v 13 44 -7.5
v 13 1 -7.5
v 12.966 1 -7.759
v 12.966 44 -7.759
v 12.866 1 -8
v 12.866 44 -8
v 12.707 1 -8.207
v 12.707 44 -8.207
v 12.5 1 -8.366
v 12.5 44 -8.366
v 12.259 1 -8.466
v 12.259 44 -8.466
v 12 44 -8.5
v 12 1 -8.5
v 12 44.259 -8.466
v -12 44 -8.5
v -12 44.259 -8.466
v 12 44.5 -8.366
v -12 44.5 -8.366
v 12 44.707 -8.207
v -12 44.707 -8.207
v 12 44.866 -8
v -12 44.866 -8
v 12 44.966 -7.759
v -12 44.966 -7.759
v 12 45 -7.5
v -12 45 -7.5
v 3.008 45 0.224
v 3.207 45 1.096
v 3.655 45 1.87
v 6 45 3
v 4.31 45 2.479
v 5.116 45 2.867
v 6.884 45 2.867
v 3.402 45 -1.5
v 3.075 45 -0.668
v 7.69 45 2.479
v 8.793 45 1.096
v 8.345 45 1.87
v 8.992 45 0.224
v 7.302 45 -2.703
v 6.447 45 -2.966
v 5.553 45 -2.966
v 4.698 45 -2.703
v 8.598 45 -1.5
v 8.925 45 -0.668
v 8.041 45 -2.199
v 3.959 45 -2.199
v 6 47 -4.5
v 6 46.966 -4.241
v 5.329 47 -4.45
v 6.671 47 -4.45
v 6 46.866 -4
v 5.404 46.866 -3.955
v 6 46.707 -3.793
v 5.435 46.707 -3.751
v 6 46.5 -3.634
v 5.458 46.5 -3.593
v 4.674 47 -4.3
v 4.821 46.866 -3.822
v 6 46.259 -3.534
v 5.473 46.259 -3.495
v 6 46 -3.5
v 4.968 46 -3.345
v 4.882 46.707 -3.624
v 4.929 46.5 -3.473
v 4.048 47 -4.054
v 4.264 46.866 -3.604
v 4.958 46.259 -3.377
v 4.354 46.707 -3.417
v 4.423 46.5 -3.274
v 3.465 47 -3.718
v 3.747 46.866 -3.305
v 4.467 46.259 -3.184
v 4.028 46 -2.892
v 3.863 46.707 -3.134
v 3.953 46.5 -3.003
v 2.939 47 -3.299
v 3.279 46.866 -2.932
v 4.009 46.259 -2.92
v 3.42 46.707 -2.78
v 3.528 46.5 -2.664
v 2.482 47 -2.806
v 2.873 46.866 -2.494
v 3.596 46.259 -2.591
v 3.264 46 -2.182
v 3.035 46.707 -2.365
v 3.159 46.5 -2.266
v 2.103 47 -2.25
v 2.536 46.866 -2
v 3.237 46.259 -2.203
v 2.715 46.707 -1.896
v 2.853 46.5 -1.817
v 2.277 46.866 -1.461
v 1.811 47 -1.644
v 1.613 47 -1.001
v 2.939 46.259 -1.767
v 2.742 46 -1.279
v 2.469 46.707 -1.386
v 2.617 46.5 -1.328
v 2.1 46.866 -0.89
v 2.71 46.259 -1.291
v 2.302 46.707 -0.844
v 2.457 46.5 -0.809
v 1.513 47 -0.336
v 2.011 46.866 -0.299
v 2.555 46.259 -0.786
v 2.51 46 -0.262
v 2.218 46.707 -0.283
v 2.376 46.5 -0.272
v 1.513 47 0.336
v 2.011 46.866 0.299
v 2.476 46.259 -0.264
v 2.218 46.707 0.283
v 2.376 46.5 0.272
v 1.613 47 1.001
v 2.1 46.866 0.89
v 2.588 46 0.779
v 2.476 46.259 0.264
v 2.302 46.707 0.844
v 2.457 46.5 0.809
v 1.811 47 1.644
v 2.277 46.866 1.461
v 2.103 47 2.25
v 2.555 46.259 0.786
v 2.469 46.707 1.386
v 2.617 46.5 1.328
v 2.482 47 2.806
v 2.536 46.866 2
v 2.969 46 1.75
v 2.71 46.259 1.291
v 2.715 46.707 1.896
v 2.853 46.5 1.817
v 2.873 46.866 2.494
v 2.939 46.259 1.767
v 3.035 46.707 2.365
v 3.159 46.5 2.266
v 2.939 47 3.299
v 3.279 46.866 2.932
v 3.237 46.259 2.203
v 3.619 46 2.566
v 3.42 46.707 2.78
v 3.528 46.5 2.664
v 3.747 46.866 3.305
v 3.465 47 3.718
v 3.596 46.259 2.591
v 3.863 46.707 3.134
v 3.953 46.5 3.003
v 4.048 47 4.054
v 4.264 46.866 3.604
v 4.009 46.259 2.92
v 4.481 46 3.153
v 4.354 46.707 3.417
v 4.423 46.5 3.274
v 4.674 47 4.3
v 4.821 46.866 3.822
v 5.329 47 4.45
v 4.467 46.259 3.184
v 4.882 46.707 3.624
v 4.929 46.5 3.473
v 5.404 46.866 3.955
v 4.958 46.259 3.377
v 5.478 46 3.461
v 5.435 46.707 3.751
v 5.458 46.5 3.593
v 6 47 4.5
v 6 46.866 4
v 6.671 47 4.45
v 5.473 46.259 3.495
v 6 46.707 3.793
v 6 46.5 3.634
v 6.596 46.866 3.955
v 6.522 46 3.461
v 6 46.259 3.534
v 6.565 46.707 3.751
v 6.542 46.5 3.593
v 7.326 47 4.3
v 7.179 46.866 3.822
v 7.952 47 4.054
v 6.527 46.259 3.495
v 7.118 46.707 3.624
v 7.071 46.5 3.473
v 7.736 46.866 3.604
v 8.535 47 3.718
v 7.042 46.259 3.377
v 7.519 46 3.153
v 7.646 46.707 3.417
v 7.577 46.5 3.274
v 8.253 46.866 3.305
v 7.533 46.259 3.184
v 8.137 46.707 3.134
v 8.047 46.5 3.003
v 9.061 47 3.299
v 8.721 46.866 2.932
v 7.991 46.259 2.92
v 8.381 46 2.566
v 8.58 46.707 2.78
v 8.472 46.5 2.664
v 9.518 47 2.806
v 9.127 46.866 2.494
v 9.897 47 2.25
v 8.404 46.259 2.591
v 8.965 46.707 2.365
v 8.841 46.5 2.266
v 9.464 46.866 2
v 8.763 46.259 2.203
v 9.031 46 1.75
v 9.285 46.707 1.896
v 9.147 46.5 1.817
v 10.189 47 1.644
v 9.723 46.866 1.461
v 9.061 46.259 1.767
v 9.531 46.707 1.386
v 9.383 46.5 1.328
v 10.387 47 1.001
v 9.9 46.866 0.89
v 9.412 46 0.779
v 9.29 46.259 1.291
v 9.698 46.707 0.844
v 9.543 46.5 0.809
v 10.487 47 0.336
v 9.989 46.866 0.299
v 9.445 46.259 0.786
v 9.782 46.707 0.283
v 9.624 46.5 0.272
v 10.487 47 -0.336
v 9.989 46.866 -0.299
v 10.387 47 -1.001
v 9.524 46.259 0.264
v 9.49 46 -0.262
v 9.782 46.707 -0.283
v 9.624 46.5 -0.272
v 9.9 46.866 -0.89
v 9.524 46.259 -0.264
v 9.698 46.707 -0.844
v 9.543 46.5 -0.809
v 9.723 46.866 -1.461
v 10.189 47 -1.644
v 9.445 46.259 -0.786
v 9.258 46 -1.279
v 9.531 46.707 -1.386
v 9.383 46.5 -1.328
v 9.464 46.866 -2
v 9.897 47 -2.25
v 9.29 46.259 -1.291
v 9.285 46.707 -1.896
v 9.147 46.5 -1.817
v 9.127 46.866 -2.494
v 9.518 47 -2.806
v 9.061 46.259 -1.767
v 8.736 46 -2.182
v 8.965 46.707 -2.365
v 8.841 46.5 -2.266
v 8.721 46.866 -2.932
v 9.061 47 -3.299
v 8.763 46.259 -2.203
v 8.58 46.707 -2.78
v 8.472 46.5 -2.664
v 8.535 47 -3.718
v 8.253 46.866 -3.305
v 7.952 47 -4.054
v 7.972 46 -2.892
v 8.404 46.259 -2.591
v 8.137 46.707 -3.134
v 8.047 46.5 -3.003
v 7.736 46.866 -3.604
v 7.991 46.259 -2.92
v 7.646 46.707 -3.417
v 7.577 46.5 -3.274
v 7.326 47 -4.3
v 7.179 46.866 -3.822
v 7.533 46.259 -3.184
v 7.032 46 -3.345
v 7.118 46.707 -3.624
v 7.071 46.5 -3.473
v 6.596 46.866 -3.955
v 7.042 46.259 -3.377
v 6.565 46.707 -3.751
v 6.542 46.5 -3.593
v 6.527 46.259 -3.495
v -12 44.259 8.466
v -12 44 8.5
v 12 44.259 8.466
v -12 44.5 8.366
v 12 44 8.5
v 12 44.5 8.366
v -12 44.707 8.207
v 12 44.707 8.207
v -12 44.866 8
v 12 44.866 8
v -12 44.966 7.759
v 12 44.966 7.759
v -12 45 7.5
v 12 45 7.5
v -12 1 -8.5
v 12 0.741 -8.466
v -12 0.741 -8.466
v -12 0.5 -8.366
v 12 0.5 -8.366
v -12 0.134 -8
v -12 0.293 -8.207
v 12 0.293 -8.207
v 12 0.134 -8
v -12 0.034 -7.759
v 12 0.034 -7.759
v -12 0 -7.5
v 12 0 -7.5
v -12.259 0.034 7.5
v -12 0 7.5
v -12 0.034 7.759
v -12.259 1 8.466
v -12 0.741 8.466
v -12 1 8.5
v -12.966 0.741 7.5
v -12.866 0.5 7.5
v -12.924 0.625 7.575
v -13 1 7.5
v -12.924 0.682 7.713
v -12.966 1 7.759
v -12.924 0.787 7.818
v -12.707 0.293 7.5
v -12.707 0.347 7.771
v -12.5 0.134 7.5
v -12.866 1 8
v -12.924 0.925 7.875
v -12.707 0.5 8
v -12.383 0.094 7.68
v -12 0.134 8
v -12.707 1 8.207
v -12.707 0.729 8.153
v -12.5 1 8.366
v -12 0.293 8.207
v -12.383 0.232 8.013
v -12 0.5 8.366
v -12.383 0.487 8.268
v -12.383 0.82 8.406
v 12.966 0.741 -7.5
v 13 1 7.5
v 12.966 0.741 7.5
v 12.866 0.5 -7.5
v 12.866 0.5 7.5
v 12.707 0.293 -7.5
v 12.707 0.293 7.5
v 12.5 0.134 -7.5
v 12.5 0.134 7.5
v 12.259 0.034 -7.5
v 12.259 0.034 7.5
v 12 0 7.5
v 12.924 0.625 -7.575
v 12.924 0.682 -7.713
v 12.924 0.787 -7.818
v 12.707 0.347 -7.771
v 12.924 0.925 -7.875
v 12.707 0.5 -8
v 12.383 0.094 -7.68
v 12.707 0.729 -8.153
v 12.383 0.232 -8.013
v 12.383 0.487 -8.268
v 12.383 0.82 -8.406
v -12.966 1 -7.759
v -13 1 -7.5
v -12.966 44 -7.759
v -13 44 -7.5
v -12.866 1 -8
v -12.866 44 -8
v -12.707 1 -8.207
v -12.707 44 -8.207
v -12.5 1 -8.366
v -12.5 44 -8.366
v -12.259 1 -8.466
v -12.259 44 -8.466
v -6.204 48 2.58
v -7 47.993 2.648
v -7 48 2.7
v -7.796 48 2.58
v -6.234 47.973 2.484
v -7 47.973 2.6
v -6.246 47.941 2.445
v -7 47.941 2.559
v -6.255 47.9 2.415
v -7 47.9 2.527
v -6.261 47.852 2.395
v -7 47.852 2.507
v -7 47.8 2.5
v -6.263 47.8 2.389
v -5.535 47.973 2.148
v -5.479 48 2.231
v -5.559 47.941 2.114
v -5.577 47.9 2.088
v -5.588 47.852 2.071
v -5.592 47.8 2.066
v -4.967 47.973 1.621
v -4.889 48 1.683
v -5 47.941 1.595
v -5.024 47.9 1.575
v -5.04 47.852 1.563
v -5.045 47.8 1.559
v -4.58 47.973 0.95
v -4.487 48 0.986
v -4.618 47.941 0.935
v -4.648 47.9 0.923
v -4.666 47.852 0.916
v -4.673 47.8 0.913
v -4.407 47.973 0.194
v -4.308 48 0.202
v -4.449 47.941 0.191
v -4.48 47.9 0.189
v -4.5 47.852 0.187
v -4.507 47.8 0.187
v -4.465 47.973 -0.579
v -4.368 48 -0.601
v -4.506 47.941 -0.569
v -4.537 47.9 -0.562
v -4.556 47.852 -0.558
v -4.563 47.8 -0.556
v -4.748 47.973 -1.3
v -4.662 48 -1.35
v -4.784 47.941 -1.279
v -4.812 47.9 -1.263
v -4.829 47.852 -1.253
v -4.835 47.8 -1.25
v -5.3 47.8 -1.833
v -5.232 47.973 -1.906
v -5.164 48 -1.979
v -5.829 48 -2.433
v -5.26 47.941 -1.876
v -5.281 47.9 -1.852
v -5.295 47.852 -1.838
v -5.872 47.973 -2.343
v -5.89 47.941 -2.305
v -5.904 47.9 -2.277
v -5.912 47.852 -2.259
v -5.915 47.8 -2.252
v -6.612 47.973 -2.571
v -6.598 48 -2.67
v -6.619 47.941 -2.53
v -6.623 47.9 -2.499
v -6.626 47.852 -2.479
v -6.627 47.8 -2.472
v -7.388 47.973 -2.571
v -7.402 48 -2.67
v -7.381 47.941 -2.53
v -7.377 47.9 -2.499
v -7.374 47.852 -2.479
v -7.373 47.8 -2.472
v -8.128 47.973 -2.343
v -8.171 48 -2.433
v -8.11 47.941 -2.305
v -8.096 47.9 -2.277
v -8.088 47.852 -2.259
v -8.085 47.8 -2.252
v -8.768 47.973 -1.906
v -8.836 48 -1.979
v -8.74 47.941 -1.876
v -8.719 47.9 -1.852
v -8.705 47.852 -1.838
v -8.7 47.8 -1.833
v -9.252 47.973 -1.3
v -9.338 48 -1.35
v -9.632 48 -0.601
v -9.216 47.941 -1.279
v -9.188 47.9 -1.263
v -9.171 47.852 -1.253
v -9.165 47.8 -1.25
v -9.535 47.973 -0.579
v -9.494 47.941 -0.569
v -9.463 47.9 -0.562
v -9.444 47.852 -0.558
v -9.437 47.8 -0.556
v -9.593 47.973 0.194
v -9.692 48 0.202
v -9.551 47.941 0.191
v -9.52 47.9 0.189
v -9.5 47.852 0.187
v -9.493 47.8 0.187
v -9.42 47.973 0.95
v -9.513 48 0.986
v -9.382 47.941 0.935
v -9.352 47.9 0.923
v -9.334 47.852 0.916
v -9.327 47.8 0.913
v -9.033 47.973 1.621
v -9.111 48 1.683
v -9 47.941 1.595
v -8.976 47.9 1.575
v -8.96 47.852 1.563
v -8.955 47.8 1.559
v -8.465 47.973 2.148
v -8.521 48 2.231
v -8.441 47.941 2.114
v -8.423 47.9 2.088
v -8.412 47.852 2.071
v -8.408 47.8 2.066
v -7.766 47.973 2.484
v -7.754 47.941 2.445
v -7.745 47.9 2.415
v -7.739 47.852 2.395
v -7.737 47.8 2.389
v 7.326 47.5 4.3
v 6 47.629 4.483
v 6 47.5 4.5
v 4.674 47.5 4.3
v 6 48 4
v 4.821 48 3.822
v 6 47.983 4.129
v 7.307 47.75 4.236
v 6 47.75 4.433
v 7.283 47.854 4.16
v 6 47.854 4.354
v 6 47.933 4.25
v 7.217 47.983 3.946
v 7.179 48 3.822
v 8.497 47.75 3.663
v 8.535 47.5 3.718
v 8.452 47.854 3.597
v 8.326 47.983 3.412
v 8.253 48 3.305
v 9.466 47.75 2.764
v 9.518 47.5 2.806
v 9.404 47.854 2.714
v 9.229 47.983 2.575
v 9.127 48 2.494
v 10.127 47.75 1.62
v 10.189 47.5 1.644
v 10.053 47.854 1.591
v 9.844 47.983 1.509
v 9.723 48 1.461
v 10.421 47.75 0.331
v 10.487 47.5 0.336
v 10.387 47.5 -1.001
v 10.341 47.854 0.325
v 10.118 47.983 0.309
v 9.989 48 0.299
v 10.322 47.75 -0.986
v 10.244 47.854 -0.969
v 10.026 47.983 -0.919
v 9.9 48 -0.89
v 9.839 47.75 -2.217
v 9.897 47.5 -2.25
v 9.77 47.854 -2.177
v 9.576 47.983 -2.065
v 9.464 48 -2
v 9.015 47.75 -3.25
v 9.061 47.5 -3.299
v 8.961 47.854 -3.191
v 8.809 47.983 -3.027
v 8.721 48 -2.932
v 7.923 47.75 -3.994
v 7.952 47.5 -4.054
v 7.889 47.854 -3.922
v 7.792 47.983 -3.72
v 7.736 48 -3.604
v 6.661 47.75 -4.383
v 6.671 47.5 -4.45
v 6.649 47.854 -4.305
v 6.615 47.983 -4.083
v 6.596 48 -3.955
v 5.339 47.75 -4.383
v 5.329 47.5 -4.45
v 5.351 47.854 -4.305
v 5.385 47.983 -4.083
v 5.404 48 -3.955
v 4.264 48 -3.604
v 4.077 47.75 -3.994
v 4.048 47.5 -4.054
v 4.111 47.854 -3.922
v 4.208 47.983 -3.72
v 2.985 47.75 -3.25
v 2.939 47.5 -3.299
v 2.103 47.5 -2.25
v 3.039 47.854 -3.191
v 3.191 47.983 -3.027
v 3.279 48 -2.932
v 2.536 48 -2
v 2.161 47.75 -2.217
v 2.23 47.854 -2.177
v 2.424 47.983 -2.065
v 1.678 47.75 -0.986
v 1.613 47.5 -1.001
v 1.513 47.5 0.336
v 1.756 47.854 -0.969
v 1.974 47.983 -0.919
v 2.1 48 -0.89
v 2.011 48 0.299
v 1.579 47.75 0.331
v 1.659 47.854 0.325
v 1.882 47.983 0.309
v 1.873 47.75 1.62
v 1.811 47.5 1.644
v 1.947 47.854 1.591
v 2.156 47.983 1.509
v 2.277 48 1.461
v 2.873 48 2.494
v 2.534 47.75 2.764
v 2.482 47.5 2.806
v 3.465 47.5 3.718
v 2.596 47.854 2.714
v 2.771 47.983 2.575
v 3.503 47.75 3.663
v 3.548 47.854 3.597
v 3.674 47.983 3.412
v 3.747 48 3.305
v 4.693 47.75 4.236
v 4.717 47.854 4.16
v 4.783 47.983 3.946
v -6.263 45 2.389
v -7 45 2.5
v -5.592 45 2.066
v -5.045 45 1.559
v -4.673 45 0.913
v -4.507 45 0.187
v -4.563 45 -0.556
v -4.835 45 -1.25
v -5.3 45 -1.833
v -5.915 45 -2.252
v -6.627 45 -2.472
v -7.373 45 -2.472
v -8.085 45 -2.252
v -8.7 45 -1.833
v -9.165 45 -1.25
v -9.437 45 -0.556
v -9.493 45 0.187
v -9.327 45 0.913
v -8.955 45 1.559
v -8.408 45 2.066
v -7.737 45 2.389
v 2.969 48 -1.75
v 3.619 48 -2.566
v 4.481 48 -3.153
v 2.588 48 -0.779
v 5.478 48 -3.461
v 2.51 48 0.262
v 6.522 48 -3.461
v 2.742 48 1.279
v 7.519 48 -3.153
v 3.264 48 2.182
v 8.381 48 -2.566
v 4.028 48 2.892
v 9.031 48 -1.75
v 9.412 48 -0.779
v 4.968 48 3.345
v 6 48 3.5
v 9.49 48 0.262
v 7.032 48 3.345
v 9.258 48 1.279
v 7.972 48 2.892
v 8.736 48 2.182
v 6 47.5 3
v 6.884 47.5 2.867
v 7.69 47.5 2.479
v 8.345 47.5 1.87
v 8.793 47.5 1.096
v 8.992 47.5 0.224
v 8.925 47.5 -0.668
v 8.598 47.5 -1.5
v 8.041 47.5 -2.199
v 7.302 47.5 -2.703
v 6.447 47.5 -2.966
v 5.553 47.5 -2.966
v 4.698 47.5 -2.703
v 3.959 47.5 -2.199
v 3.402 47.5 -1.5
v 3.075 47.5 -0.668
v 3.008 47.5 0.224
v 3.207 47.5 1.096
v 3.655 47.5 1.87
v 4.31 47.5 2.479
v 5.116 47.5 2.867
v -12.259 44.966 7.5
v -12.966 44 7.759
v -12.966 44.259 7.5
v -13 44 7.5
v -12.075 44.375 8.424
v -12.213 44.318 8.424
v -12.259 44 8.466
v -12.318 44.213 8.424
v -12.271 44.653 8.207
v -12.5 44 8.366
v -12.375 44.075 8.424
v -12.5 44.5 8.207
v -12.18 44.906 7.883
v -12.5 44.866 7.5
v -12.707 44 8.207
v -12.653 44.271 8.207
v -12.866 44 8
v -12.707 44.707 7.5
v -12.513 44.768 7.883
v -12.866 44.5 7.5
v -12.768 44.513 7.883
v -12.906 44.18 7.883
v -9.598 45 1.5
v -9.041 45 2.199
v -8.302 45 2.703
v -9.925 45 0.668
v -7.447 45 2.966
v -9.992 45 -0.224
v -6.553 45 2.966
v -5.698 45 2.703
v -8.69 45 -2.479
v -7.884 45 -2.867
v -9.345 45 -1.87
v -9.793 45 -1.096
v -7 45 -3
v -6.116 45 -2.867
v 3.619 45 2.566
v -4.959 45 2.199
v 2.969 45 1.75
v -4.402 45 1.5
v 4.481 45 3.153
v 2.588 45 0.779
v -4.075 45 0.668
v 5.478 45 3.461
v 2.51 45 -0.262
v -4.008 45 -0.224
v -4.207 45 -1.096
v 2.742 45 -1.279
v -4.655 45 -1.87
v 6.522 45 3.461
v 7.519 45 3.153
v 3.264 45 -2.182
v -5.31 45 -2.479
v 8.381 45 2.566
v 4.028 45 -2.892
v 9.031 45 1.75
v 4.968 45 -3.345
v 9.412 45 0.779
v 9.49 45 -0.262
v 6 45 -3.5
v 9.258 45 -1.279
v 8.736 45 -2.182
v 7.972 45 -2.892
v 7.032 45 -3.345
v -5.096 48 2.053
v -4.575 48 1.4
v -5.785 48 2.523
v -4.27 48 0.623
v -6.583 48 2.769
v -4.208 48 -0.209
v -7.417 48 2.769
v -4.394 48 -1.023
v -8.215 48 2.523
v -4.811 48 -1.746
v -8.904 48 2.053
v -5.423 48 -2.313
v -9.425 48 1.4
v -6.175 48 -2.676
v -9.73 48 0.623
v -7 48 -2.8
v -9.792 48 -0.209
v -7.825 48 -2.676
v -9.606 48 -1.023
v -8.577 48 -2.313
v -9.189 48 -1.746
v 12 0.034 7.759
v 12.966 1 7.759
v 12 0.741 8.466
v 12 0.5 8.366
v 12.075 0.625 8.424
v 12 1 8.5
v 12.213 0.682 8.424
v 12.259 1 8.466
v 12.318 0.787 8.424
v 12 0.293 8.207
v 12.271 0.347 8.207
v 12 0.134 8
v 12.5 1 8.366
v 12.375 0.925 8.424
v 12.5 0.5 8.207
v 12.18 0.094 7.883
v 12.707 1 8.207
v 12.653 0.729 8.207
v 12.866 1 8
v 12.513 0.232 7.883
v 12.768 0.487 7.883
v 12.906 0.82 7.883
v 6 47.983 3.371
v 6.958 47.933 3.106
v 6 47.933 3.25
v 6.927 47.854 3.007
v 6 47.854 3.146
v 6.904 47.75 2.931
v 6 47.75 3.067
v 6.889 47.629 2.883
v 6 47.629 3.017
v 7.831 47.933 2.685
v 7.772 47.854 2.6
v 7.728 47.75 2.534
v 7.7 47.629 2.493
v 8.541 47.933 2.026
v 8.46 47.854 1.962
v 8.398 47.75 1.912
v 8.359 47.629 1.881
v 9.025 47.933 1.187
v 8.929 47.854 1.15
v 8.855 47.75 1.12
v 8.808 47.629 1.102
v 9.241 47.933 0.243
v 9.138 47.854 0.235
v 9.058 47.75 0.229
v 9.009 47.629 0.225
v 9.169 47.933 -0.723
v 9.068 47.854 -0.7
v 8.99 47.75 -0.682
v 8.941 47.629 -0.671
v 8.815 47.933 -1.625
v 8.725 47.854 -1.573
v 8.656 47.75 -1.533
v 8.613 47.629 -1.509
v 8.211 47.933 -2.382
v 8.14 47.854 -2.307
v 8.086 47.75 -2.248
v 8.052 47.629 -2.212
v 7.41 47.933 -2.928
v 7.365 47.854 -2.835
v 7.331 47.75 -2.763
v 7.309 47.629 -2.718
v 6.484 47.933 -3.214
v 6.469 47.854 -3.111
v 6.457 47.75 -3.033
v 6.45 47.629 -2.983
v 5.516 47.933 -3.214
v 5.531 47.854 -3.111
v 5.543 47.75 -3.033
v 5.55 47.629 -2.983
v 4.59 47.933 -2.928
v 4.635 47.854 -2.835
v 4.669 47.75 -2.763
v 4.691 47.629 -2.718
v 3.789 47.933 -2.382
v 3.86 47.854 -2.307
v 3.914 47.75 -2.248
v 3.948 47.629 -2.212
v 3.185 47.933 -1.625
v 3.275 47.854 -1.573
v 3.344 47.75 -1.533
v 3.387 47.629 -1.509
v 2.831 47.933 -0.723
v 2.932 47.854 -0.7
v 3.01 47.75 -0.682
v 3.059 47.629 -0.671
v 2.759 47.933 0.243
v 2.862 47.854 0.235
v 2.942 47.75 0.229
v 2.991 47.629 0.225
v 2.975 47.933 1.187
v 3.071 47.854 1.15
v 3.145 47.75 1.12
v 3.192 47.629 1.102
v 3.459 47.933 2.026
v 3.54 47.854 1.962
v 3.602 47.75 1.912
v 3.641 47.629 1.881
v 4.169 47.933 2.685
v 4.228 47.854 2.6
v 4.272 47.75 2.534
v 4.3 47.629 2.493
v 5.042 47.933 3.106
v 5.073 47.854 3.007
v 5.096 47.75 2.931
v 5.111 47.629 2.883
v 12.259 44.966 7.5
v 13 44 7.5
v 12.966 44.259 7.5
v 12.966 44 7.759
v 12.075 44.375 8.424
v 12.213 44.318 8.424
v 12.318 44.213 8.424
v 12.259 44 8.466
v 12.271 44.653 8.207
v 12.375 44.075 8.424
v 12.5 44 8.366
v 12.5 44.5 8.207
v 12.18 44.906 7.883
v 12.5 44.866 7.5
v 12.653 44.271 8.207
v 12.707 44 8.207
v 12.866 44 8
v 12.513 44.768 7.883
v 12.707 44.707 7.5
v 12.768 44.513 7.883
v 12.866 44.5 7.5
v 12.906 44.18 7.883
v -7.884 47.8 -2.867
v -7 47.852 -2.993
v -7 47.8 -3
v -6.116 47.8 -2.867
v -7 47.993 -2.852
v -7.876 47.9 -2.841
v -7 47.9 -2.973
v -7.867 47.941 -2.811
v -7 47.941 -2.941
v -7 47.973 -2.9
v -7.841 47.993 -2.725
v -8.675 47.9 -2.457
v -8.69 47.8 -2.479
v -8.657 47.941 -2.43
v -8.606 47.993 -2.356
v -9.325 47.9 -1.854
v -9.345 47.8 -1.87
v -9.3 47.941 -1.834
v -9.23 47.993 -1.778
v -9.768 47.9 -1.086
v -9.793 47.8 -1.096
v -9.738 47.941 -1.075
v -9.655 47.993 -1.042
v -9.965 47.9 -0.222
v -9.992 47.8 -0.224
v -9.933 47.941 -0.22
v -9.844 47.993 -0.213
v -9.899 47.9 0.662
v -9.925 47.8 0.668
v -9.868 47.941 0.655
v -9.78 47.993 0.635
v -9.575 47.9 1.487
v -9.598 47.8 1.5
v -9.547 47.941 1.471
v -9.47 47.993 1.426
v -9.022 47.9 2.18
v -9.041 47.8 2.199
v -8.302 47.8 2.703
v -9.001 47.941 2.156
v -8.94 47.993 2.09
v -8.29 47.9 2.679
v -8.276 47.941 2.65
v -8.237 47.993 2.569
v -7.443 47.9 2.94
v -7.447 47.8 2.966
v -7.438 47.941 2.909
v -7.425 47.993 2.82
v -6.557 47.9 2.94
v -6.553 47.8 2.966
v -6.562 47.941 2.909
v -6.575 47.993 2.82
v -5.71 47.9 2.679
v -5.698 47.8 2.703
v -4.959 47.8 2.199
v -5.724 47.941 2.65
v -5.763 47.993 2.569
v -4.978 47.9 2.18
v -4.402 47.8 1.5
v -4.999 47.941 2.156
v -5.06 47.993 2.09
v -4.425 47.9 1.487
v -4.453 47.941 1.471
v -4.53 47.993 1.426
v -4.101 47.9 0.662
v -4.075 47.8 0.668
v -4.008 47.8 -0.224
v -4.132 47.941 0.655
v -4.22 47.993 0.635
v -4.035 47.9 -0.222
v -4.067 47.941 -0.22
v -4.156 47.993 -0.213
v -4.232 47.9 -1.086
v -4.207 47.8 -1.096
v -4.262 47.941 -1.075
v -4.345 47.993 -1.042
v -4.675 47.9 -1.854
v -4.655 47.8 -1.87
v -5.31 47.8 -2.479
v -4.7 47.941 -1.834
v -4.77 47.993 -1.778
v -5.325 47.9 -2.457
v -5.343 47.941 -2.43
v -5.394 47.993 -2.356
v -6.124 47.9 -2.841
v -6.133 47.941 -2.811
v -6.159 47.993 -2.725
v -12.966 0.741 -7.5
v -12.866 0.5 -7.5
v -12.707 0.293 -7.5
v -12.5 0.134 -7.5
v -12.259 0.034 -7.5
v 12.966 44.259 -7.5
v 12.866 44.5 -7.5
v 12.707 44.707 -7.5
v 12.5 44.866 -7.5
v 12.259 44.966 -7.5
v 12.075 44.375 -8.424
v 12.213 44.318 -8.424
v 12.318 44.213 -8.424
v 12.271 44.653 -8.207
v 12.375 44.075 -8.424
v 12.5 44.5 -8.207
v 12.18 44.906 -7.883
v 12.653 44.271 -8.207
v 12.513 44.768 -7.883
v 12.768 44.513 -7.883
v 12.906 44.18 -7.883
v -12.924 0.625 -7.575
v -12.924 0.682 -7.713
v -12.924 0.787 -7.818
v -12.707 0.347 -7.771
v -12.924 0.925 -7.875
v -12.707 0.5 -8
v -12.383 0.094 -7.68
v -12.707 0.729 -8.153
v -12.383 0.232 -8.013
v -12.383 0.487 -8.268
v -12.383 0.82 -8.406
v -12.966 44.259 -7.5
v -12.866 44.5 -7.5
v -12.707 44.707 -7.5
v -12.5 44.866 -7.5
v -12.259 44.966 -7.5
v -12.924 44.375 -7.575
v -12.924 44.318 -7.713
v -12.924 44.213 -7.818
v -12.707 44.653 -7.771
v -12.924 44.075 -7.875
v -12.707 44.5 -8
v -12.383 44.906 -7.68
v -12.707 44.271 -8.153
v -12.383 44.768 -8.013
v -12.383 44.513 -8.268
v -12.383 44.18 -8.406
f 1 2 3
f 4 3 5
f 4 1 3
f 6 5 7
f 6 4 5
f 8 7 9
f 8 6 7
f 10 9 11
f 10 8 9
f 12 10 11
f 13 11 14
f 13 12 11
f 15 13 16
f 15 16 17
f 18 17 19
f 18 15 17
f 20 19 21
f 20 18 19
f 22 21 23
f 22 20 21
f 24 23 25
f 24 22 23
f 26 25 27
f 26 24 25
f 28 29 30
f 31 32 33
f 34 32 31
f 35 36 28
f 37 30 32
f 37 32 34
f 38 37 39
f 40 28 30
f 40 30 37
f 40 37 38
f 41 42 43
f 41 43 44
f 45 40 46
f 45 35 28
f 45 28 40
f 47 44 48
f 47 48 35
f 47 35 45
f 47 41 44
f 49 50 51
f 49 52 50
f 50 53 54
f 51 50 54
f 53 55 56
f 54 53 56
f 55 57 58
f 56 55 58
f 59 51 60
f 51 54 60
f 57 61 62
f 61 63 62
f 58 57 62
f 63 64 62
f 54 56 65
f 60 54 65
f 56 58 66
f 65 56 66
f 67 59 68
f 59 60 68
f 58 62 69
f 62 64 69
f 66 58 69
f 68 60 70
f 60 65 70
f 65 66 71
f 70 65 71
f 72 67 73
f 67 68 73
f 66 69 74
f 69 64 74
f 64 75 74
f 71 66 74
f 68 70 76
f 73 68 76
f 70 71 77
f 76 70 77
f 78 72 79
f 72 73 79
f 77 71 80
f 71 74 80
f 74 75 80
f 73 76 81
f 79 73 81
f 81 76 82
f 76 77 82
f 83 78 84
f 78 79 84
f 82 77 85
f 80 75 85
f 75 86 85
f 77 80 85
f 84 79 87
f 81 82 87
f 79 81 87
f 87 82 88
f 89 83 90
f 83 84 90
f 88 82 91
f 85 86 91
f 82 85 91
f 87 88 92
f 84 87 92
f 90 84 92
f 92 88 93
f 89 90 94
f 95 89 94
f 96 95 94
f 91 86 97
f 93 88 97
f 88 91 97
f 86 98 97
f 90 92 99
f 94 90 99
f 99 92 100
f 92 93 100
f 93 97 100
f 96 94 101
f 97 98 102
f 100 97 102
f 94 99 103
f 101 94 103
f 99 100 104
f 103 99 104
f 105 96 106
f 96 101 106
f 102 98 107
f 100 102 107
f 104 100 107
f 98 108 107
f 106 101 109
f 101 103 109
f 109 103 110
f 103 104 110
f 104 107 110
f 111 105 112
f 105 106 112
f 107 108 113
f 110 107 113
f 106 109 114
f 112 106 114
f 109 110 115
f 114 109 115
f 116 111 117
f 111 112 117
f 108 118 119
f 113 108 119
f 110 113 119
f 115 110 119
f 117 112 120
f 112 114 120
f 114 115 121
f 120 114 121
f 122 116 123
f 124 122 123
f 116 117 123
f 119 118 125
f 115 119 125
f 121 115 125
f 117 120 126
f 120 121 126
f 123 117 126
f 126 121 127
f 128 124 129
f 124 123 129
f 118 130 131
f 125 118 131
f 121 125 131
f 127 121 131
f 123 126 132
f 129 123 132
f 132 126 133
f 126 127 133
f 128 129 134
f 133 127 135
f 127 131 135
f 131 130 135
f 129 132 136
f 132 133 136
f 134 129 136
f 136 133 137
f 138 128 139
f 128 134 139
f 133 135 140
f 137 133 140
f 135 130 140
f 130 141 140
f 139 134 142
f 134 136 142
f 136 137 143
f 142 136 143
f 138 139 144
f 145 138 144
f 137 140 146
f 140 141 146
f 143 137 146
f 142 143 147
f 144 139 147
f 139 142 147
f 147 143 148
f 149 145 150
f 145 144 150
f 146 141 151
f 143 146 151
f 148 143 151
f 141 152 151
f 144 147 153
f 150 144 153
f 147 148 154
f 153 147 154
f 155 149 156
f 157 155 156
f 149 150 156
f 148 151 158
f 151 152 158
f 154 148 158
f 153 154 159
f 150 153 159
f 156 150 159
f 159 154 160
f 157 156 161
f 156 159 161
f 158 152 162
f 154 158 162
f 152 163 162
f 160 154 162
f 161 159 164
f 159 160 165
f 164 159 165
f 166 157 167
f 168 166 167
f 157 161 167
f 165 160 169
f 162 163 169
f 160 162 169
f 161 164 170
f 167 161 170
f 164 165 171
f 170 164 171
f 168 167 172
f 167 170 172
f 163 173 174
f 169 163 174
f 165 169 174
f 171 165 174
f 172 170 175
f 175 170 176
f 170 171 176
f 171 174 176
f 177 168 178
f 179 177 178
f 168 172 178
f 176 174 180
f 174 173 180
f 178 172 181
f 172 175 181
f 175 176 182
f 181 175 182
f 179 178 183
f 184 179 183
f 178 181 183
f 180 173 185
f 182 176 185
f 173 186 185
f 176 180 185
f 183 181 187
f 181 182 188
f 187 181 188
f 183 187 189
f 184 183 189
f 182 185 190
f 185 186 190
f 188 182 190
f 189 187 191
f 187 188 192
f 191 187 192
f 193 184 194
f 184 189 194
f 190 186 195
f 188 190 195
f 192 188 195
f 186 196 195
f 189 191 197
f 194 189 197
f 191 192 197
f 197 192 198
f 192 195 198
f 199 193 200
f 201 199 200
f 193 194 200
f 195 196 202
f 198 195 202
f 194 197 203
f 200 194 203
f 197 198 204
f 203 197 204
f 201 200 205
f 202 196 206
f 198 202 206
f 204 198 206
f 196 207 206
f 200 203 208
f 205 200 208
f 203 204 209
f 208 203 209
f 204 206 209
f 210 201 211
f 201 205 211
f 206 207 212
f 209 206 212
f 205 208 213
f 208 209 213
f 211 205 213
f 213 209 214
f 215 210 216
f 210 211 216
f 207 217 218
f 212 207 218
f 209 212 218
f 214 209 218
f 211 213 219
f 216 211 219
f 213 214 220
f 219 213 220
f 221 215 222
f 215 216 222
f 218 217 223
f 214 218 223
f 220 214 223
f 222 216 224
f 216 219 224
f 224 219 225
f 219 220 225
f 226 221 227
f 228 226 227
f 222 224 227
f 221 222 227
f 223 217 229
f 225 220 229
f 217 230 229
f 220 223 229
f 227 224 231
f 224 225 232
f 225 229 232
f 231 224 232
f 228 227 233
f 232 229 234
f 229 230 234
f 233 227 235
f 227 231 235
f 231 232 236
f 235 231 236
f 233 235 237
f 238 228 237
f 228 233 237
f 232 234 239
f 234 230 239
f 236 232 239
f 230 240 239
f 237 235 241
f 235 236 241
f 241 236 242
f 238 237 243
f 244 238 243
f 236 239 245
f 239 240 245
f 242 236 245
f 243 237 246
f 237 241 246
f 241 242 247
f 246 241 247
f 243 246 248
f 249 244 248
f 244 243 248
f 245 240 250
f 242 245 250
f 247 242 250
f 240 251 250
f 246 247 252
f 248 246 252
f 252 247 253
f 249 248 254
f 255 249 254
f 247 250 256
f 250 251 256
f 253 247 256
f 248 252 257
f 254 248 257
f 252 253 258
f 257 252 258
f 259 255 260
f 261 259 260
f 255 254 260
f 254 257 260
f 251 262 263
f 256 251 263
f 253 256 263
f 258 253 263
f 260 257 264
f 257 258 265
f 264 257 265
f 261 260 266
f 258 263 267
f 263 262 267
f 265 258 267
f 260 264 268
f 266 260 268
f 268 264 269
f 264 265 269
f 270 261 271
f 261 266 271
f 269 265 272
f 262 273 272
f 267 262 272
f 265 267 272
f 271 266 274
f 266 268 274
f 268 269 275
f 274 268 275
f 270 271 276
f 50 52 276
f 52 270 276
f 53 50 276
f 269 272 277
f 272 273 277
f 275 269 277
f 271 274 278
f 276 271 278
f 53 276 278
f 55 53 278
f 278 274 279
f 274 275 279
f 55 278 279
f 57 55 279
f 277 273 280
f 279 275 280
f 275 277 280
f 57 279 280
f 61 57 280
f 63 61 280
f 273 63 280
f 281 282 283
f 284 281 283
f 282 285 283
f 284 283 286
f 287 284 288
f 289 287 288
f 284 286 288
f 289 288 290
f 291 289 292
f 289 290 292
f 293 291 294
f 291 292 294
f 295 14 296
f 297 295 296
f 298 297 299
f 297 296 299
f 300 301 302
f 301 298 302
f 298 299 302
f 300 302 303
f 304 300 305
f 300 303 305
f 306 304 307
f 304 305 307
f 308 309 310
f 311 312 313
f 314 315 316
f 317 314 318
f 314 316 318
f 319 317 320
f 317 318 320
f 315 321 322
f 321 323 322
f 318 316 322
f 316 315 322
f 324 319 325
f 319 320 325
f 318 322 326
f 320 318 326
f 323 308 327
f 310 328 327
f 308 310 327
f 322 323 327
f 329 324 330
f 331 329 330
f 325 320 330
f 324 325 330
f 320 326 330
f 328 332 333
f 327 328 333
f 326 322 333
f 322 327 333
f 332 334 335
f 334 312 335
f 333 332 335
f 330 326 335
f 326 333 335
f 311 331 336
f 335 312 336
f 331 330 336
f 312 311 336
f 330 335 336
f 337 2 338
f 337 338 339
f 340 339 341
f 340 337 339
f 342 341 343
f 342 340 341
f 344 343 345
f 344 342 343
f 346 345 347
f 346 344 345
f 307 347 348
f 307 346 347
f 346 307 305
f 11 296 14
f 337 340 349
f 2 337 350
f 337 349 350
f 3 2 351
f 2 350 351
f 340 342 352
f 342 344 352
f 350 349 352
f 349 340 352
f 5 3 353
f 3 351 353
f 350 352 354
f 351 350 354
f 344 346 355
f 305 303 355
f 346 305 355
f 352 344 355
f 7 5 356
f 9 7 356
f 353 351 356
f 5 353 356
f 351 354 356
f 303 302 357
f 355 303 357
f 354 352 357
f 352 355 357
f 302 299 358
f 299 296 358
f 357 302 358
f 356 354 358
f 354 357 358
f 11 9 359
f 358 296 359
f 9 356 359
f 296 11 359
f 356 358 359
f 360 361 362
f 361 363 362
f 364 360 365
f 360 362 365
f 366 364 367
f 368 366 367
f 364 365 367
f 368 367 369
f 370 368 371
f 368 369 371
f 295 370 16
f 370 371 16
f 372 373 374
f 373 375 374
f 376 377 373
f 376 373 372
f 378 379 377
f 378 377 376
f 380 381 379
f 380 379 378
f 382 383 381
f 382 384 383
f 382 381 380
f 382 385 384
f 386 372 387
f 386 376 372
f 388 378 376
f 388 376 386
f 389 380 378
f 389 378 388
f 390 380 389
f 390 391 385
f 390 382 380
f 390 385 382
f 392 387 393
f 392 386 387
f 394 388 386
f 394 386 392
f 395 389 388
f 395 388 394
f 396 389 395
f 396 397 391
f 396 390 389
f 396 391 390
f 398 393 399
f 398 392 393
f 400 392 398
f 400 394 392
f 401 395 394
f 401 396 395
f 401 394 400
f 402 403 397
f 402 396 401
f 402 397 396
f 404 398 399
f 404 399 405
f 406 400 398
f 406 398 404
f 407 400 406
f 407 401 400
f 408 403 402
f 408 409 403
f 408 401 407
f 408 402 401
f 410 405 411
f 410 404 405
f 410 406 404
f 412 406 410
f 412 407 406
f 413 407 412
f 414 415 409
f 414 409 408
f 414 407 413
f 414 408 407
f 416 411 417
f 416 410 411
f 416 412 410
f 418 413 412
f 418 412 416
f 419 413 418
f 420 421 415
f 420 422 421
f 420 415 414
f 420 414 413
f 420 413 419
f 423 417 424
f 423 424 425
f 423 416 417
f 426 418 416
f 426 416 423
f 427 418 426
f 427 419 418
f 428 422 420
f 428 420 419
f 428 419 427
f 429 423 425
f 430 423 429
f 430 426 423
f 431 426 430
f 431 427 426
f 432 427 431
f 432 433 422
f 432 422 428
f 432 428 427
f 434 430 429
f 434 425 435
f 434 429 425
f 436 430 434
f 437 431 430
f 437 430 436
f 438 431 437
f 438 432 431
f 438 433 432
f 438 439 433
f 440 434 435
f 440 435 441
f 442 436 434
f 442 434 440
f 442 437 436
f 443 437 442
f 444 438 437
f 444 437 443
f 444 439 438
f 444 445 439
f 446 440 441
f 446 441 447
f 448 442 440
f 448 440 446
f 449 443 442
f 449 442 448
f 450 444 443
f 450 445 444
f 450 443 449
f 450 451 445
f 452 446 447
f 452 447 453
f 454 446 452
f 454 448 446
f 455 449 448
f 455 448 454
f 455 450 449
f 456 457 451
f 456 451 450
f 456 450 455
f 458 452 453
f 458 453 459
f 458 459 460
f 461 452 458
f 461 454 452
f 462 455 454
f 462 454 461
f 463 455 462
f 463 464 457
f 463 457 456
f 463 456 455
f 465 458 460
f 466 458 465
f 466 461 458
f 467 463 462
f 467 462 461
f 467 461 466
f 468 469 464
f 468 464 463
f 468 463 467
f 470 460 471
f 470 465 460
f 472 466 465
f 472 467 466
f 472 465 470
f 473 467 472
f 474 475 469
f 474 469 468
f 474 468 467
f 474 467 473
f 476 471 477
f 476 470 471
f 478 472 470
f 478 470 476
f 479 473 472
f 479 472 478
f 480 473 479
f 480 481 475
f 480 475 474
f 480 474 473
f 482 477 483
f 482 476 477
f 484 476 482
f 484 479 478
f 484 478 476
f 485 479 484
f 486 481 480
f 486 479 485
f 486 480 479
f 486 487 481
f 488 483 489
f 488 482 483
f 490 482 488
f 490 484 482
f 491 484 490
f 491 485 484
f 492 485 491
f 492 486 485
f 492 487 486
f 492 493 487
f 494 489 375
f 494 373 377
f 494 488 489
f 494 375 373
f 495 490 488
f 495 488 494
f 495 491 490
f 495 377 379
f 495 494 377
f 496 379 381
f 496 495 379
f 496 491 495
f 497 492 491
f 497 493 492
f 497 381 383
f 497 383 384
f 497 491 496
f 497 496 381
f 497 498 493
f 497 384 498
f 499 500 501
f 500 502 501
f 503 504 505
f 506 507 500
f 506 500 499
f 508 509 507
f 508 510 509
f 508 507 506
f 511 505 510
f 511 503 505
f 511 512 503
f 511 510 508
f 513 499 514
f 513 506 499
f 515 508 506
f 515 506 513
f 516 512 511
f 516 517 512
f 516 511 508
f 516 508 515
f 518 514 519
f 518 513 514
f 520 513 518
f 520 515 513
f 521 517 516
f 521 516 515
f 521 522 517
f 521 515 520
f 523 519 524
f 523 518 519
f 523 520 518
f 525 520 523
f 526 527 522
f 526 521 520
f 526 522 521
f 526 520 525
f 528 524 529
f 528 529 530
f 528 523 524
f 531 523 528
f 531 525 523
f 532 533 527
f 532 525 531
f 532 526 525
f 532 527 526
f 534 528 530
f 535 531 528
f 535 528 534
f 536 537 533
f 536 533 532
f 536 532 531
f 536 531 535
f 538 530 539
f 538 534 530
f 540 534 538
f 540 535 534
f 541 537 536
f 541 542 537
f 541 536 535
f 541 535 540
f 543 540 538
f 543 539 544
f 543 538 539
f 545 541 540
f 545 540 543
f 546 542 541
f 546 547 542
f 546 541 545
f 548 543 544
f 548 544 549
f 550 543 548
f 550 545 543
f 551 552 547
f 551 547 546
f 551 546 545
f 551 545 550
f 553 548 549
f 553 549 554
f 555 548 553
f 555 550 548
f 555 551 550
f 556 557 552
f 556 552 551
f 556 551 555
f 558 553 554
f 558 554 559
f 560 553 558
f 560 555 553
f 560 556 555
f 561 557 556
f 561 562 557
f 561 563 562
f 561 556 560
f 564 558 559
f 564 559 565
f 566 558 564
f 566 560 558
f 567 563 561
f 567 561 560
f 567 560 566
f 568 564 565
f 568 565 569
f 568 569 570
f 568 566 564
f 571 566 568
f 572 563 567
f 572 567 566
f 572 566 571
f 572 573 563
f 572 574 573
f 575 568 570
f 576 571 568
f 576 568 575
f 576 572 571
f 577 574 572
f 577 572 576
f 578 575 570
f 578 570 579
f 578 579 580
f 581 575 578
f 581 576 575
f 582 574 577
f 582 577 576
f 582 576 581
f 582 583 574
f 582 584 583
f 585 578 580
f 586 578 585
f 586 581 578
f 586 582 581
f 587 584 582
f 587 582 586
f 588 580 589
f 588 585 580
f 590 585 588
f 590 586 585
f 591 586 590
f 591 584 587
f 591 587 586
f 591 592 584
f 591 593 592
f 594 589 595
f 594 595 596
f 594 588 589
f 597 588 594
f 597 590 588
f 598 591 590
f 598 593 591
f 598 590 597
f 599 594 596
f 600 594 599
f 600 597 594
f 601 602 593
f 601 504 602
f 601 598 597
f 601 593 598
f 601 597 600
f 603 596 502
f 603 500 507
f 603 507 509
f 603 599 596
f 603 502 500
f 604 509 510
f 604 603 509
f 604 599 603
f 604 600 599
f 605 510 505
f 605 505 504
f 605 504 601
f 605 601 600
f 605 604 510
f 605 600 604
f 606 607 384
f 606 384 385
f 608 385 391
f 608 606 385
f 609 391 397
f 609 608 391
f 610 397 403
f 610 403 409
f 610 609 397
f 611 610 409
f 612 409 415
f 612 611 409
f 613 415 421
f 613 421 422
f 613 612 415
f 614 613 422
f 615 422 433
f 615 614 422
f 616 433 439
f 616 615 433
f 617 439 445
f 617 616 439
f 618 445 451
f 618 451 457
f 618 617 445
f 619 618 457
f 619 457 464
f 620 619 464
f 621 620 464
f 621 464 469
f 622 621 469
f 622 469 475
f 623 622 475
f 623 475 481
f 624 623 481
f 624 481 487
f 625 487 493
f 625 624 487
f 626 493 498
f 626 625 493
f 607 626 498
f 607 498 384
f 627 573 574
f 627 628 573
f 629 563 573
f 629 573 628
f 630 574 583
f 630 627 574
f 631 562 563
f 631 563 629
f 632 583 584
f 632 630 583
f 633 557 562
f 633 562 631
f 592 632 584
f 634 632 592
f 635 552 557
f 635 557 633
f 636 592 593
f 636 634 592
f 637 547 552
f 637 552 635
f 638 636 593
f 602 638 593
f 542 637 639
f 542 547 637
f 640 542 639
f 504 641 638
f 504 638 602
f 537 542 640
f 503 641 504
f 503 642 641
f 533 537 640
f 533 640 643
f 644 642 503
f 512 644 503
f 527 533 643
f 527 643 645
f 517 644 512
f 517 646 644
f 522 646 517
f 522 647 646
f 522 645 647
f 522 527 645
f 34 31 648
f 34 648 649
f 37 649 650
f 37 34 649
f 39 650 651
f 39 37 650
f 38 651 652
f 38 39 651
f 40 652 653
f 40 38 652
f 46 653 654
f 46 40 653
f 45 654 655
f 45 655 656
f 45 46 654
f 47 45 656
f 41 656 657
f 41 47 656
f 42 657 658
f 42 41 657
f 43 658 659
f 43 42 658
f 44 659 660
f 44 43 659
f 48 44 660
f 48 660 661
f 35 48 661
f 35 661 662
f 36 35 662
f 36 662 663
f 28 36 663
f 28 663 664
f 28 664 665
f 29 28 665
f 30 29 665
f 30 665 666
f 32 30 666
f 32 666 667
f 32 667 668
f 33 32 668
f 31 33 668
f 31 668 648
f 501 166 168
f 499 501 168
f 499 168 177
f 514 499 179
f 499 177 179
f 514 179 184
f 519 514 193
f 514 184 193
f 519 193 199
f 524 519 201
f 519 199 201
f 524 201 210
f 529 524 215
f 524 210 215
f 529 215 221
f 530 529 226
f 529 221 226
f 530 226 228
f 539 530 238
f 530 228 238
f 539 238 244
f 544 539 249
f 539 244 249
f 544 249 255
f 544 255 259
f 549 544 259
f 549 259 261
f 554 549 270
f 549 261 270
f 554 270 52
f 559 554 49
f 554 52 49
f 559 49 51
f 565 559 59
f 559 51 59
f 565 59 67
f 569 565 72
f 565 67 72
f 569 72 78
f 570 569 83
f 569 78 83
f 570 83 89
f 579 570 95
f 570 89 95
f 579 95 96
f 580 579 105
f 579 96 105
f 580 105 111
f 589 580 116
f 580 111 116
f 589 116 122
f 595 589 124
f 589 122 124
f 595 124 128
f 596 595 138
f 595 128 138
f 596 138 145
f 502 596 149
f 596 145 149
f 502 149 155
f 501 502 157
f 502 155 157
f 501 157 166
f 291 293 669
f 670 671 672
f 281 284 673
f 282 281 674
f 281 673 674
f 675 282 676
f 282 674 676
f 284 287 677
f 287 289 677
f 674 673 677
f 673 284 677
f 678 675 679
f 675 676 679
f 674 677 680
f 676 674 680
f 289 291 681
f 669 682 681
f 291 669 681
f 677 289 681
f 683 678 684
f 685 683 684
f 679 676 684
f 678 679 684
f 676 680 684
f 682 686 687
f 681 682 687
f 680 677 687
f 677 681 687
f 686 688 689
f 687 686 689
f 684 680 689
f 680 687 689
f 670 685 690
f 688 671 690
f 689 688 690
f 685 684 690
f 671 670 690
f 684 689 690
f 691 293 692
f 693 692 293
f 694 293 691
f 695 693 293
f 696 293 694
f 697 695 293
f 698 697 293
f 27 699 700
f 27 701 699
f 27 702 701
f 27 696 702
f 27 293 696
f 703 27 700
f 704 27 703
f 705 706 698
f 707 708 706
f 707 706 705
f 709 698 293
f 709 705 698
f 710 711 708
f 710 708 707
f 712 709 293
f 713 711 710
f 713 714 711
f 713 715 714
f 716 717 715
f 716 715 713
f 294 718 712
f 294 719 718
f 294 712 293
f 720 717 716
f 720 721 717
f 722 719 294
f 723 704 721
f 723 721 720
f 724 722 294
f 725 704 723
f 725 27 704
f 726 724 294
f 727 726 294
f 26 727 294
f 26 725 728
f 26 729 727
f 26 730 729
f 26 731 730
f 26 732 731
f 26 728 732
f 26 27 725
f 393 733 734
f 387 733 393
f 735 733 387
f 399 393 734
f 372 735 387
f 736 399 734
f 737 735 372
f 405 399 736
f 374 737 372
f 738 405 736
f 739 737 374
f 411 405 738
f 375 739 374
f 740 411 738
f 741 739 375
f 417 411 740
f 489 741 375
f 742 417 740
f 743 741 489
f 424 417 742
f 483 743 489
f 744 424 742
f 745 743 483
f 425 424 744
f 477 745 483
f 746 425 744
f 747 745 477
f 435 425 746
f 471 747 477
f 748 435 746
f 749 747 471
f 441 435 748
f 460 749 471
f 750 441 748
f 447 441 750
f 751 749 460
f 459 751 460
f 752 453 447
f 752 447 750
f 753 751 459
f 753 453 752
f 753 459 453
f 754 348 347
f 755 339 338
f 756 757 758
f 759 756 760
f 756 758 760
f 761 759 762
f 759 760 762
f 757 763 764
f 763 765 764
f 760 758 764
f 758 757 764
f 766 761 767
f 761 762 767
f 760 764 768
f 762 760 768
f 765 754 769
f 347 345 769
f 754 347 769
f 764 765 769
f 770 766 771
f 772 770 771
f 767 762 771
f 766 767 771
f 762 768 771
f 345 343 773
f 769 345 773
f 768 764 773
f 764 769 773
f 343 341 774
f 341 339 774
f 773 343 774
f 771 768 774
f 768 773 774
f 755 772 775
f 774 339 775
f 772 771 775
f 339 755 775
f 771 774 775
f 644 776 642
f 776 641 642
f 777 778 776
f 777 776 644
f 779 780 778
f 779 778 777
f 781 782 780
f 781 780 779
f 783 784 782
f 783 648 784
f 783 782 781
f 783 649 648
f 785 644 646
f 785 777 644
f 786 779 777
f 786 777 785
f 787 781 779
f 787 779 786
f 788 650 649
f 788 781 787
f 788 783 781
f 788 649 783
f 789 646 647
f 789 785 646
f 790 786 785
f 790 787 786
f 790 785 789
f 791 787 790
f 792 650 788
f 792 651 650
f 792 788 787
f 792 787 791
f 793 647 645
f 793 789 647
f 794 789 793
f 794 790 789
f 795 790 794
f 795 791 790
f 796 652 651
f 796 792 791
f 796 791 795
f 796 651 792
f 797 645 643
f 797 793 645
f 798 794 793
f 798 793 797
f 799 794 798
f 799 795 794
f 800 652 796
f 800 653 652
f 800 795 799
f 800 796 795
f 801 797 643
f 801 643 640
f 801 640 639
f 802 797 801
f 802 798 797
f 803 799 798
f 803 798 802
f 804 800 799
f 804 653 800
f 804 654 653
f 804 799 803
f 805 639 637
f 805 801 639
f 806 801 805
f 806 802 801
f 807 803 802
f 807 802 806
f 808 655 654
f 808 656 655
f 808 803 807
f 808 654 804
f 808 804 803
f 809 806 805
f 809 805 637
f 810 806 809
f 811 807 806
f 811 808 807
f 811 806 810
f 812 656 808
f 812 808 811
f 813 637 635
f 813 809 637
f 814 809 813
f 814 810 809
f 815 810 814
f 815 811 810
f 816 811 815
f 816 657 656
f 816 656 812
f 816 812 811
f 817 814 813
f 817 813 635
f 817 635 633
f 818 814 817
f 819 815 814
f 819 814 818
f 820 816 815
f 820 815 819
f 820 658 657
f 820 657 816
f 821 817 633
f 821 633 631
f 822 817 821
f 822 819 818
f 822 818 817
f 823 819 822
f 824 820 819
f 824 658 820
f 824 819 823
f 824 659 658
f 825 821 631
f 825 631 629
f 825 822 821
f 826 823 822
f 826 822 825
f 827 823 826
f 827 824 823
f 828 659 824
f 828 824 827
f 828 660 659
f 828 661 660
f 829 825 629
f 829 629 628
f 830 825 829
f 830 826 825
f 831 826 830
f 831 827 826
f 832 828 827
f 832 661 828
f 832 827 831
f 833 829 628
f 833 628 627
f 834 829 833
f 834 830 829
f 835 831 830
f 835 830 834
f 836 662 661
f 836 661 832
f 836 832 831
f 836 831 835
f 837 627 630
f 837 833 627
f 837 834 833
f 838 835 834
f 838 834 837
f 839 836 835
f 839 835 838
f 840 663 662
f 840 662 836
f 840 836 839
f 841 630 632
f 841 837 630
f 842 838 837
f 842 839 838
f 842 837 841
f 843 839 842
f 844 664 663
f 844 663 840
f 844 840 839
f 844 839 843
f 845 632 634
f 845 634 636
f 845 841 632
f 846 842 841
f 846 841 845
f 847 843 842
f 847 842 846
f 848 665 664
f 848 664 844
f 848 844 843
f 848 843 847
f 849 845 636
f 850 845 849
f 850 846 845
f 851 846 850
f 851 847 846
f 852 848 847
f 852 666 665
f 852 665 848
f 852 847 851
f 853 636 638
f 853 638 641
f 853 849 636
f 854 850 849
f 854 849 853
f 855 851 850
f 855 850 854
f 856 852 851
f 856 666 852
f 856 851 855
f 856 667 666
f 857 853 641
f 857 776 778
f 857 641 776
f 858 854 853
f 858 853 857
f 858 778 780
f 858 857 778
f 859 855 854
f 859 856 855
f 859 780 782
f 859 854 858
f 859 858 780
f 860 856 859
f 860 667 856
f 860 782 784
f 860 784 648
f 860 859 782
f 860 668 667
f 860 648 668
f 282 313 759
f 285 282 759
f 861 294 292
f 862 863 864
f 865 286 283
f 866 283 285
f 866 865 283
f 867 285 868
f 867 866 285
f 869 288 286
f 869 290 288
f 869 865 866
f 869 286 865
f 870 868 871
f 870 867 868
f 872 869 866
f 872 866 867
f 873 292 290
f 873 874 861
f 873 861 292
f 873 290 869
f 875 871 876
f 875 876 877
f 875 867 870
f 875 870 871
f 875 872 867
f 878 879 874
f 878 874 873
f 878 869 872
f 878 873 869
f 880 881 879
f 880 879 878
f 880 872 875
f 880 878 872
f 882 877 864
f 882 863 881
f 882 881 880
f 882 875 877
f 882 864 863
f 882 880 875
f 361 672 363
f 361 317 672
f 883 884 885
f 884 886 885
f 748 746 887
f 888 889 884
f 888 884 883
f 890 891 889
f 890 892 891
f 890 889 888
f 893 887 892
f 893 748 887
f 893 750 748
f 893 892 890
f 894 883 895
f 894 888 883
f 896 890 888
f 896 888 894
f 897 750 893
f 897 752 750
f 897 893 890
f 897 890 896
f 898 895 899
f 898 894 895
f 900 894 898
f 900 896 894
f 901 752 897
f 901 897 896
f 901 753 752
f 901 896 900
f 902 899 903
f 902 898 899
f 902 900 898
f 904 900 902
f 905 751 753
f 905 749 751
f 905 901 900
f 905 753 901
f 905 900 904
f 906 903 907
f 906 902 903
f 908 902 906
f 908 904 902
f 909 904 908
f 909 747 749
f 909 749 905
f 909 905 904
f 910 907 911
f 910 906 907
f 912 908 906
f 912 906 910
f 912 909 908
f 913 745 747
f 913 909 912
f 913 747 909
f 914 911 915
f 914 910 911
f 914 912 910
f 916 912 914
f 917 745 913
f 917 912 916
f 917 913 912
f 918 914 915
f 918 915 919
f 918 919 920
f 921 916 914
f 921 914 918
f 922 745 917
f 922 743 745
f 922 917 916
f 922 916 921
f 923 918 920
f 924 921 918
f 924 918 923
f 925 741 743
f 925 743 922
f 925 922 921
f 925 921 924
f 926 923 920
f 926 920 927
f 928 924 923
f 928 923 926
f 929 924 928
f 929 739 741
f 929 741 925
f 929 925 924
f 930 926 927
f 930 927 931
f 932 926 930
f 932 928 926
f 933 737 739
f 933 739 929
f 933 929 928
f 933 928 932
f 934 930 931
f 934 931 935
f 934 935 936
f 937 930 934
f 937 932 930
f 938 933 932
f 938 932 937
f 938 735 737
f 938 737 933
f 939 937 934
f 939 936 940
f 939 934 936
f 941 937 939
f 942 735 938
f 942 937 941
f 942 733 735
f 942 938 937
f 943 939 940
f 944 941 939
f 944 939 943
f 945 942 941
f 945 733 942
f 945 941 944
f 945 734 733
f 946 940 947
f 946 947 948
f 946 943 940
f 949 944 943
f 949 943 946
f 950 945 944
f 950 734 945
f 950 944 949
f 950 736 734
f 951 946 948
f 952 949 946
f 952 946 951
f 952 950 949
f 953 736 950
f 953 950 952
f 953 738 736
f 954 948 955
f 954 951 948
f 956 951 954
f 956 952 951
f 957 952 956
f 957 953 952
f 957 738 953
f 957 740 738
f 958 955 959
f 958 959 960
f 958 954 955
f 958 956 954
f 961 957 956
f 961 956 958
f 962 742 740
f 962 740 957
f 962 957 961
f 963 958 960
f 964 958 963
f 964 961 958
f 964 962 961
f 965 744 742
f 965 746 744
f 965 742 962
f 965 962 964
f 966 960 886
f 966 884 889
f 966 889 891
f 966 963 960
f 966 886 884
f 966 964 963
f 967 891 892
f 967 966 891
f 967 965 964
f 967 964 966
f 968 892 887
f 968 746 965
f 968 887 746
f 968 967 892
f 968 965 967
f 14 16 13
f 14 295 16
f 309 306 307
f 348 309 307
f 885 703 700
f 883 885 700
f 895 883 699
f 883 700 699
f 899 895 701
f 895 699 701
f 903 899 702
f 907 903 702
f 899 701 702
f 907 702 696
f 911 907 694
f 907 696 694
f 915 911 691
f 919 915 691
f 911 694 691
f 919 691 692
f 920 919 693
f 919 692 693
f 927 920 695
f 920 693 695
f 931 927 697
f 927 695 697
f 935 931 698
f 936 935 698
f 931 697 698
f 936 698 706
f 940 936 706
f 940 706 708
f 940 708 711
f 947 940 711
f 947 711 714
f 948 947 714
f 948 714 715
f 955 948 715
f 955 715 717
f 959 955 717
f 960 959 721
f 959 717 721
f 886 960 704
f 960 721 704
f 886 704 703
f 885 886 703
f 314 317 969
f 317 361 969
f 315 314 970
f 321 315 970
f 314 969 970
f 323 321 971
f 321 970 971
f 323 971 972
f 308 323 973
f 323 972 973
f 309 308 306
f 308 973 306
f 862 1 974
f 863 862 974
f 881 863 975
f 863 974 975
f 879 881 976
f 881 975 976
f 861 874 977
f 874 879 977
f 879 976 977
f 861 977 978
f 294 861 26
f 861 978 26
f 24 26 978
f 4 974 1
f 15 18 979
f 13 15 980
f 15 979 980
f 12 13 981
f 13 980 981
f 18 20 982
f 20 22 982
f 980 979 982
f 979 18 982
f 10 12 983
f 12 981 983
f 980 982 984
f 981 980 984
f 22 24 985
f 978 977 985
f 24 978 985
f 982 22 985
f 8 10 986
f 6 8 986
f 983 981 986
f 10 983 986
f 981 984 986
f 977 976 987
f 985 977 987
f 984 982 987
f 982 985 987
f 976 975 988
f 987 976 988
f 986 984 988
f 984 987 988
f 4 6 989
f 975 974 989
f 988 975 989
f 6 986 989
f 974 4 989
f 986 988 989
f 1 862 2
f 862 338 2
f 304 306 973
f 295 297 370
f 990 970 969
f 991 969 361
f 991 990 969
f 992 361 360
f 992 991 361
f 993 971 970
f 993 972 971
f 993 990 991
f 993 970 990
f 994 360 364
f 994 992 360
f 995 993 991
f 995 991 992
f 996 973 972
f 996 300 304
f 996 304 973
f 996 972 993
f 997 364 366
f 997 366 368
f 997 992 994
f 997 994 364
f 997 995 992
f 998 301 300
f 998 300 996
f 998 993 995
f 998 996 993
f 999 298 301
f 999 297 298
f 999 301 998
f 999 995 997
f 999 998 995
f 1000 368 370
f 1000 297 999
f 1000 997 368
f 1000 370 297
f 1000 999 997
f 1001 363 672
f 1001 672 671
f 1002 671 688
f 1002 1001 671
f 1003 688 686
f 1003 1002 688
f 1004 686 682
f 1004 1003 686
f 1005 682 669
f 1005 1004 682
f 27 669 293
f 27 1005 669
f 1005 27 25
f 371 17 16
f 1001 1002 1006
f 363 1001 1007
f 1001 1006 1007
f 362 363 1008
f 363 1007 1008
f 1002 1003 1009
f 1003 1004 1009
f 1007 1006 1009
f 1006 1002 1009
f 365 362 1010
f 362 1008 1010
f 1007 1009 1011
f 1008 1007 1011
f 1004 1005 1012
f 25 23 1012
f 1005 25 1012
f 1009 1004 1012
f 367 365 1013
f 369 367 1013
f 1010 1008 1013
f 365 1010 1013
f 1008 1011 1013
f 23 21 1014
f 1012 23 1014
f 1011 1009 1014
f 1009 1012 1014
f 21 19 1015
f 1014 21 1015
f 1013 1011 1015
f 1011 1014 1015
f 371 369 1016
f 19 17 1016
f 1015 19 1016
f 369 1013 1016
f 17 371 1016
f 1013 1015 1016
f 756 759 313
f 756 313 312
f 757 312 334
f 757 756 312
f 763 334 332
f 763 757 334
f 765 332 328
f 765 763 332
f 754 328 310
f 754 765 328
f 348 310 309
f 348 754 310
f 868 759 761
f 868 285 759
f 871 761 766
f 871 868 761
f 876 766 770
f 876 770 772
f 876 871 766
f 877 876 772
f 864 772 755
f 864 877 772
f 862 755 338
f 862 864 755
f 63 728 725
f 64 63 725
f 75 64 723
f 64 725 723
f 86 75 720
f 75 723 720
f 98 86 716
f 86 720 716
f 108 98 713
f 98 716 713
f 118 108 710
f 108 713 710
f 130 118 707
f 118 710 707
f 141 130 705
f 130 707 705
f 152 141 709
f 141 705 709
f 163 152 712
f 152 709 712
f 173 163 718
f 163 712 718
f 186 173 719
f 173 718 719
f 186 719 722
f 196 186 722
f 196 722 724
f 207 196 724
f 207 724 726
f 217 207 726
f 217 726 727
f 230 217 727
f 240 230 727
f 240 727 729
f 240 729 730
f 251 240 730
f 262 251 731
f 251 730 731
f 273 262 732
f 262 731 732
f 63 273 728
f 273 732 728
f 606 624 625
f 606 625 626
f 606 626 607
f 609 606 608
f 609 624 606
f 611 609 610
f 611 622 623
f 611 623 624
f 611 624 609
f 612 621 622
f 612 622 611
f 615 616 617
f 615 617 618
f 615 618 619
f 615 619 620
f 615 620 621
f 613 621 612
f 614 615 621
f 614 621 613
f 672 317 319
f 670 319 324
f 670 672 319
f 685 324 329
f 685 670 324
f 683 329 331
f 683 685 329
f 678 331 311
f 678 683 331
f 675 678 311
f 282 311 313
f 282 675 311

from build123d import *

# Parameters (mm, degrees)
SKETCH1_W           = 26
SKETCH1_H           = 17
BOSS_EXTRUDE1_DEPTH = 45
FILLET1_R           = 1
SKETCH2_R           = 3
SKETCH2_R_2         = 2.5
BOSS_EXTRUDE2_DEPTH = 3
SKETCH3_R           = 3.5
SKETCH3_R_2         = 3
BOSS_EXTRUDE3_DEPTH = 2
SKETCH4_R           = 4.5
SKETCH4_R_2         = 3
BOSS_EXTRUDE4_DEPTH = 1
FILLET4_R           = 1
FILLET5_R           = 0.5
FILLET6_R           = 0.2


with BuildPart() as part:
    # Sketch1 → Boss-Extrude1 (new body)
    with BuildSketch(Plane(origin=(0, 0, 0), x_dir=(1, 0, 0), z_dir=(0, 1, 0))):
        Rectangle(SKETCH1_W, SKETCH1_H)
    extrude(amount=BOSS_EXTRUDE1_DEPTH)

    # Fillet1
    fillet1_edges = [part.edges().sort_by_distance(p)[0] for p in [
        (13, 45, 0),
        (0, 45, -8.5),
        (-13, 45, 0),
        (0, 0, -8.5),
        (13, 0, 0),
        (0, 0, 8.5),
        (-13, 0, 0),
        (0, 45, 8.5),
        (-13, 22.5, -8.5),
        (13, 22.5, -8.5),
        (13, 22.5, 8.5),
        (-13, 22.5, 8.5),
    ]]
    fillet(fillet1_edges, radius=FILLET1_R)

    # Sketch2 → Boss-Extrude2 (add)
    with BuildSketch(Plane(origin=(0, 45, 0), x_dir=(1, 0, 0), z_dir=(0, 1, 0))):
        with Locations(Location((-7, 0, 0), (0, 0, 90))):
            Circle(SKETCH2_R)
        with Locations(Location((-7, 0, 0), (0, 0, 270))):
            Circle(SKETCH2_R_2, mode=Mode.SUBTRACT)
    extrude(amount=BOSS_EXTRUDE2_DEPTH)

    # Sketch3 → Boss-Extrude3 (add)
    with BuildSketch(Plane(origin=(0, 45, 0), x_dir=(1, 0, 0), z_dir=(0, 1, 0))):
        with Locations(Location((6, 0, 0), (0, 0, 90))):
            Circle(SKETCH3_R)
        with Locations(Location((6, 0, 0), (0, 0, 270))):
            Circle(SKETCH3_R_2, mode=Mode.SUBTRACT)
    extrude(amount=BOSS_EXTRUDE3_DEPTH)

    # Sketch4 → Boss-Extrude4 (add)
    with BuildSketch(Plane(origin=(0, 47, 0), x_dir=(1, 0, 0), z_dir=(0, 1, 0))):
        with Locations(Location((6, 0, 0), (0, 0, 270))):
            Circle(SKETCH4_R)
        with Locations(Location((6, 0, 0), (0, 0, 270))):
            Circle(SKETCH4_R_2, mode=Mode.SUBTRACT)
    extrude(amount=BOSS_EXTRUDE4_DEPTH)

    # Fillet4
    fillet4_edges = [part.edges().sort_by_distance(p)[0] for p in [
        (6, 47, 3.5),
    ]]
    fillet(fillet4_edges, radius=FILLET4_R - 0.0001)  # a hair under: the kernel refuses the full size

    # Fillet5
    fillet5_edges = [part.edges().sort_by_distance(p)[0] for p in [
        (6, 48, -4.5),
        (6, 48, -3),
    ]]
    fillet(fillet5_edges, radius=FILLET5_R)

    # Fillet6
    fillet6_edges = [part.edges().sort_by_distance(p)[0] for p in [
        (-7, 48, 3),
        (-7, 48, -2.5),
    ]]
    fillet(fillet6_edges, radius=FILLET6_R)


solid = part.part
